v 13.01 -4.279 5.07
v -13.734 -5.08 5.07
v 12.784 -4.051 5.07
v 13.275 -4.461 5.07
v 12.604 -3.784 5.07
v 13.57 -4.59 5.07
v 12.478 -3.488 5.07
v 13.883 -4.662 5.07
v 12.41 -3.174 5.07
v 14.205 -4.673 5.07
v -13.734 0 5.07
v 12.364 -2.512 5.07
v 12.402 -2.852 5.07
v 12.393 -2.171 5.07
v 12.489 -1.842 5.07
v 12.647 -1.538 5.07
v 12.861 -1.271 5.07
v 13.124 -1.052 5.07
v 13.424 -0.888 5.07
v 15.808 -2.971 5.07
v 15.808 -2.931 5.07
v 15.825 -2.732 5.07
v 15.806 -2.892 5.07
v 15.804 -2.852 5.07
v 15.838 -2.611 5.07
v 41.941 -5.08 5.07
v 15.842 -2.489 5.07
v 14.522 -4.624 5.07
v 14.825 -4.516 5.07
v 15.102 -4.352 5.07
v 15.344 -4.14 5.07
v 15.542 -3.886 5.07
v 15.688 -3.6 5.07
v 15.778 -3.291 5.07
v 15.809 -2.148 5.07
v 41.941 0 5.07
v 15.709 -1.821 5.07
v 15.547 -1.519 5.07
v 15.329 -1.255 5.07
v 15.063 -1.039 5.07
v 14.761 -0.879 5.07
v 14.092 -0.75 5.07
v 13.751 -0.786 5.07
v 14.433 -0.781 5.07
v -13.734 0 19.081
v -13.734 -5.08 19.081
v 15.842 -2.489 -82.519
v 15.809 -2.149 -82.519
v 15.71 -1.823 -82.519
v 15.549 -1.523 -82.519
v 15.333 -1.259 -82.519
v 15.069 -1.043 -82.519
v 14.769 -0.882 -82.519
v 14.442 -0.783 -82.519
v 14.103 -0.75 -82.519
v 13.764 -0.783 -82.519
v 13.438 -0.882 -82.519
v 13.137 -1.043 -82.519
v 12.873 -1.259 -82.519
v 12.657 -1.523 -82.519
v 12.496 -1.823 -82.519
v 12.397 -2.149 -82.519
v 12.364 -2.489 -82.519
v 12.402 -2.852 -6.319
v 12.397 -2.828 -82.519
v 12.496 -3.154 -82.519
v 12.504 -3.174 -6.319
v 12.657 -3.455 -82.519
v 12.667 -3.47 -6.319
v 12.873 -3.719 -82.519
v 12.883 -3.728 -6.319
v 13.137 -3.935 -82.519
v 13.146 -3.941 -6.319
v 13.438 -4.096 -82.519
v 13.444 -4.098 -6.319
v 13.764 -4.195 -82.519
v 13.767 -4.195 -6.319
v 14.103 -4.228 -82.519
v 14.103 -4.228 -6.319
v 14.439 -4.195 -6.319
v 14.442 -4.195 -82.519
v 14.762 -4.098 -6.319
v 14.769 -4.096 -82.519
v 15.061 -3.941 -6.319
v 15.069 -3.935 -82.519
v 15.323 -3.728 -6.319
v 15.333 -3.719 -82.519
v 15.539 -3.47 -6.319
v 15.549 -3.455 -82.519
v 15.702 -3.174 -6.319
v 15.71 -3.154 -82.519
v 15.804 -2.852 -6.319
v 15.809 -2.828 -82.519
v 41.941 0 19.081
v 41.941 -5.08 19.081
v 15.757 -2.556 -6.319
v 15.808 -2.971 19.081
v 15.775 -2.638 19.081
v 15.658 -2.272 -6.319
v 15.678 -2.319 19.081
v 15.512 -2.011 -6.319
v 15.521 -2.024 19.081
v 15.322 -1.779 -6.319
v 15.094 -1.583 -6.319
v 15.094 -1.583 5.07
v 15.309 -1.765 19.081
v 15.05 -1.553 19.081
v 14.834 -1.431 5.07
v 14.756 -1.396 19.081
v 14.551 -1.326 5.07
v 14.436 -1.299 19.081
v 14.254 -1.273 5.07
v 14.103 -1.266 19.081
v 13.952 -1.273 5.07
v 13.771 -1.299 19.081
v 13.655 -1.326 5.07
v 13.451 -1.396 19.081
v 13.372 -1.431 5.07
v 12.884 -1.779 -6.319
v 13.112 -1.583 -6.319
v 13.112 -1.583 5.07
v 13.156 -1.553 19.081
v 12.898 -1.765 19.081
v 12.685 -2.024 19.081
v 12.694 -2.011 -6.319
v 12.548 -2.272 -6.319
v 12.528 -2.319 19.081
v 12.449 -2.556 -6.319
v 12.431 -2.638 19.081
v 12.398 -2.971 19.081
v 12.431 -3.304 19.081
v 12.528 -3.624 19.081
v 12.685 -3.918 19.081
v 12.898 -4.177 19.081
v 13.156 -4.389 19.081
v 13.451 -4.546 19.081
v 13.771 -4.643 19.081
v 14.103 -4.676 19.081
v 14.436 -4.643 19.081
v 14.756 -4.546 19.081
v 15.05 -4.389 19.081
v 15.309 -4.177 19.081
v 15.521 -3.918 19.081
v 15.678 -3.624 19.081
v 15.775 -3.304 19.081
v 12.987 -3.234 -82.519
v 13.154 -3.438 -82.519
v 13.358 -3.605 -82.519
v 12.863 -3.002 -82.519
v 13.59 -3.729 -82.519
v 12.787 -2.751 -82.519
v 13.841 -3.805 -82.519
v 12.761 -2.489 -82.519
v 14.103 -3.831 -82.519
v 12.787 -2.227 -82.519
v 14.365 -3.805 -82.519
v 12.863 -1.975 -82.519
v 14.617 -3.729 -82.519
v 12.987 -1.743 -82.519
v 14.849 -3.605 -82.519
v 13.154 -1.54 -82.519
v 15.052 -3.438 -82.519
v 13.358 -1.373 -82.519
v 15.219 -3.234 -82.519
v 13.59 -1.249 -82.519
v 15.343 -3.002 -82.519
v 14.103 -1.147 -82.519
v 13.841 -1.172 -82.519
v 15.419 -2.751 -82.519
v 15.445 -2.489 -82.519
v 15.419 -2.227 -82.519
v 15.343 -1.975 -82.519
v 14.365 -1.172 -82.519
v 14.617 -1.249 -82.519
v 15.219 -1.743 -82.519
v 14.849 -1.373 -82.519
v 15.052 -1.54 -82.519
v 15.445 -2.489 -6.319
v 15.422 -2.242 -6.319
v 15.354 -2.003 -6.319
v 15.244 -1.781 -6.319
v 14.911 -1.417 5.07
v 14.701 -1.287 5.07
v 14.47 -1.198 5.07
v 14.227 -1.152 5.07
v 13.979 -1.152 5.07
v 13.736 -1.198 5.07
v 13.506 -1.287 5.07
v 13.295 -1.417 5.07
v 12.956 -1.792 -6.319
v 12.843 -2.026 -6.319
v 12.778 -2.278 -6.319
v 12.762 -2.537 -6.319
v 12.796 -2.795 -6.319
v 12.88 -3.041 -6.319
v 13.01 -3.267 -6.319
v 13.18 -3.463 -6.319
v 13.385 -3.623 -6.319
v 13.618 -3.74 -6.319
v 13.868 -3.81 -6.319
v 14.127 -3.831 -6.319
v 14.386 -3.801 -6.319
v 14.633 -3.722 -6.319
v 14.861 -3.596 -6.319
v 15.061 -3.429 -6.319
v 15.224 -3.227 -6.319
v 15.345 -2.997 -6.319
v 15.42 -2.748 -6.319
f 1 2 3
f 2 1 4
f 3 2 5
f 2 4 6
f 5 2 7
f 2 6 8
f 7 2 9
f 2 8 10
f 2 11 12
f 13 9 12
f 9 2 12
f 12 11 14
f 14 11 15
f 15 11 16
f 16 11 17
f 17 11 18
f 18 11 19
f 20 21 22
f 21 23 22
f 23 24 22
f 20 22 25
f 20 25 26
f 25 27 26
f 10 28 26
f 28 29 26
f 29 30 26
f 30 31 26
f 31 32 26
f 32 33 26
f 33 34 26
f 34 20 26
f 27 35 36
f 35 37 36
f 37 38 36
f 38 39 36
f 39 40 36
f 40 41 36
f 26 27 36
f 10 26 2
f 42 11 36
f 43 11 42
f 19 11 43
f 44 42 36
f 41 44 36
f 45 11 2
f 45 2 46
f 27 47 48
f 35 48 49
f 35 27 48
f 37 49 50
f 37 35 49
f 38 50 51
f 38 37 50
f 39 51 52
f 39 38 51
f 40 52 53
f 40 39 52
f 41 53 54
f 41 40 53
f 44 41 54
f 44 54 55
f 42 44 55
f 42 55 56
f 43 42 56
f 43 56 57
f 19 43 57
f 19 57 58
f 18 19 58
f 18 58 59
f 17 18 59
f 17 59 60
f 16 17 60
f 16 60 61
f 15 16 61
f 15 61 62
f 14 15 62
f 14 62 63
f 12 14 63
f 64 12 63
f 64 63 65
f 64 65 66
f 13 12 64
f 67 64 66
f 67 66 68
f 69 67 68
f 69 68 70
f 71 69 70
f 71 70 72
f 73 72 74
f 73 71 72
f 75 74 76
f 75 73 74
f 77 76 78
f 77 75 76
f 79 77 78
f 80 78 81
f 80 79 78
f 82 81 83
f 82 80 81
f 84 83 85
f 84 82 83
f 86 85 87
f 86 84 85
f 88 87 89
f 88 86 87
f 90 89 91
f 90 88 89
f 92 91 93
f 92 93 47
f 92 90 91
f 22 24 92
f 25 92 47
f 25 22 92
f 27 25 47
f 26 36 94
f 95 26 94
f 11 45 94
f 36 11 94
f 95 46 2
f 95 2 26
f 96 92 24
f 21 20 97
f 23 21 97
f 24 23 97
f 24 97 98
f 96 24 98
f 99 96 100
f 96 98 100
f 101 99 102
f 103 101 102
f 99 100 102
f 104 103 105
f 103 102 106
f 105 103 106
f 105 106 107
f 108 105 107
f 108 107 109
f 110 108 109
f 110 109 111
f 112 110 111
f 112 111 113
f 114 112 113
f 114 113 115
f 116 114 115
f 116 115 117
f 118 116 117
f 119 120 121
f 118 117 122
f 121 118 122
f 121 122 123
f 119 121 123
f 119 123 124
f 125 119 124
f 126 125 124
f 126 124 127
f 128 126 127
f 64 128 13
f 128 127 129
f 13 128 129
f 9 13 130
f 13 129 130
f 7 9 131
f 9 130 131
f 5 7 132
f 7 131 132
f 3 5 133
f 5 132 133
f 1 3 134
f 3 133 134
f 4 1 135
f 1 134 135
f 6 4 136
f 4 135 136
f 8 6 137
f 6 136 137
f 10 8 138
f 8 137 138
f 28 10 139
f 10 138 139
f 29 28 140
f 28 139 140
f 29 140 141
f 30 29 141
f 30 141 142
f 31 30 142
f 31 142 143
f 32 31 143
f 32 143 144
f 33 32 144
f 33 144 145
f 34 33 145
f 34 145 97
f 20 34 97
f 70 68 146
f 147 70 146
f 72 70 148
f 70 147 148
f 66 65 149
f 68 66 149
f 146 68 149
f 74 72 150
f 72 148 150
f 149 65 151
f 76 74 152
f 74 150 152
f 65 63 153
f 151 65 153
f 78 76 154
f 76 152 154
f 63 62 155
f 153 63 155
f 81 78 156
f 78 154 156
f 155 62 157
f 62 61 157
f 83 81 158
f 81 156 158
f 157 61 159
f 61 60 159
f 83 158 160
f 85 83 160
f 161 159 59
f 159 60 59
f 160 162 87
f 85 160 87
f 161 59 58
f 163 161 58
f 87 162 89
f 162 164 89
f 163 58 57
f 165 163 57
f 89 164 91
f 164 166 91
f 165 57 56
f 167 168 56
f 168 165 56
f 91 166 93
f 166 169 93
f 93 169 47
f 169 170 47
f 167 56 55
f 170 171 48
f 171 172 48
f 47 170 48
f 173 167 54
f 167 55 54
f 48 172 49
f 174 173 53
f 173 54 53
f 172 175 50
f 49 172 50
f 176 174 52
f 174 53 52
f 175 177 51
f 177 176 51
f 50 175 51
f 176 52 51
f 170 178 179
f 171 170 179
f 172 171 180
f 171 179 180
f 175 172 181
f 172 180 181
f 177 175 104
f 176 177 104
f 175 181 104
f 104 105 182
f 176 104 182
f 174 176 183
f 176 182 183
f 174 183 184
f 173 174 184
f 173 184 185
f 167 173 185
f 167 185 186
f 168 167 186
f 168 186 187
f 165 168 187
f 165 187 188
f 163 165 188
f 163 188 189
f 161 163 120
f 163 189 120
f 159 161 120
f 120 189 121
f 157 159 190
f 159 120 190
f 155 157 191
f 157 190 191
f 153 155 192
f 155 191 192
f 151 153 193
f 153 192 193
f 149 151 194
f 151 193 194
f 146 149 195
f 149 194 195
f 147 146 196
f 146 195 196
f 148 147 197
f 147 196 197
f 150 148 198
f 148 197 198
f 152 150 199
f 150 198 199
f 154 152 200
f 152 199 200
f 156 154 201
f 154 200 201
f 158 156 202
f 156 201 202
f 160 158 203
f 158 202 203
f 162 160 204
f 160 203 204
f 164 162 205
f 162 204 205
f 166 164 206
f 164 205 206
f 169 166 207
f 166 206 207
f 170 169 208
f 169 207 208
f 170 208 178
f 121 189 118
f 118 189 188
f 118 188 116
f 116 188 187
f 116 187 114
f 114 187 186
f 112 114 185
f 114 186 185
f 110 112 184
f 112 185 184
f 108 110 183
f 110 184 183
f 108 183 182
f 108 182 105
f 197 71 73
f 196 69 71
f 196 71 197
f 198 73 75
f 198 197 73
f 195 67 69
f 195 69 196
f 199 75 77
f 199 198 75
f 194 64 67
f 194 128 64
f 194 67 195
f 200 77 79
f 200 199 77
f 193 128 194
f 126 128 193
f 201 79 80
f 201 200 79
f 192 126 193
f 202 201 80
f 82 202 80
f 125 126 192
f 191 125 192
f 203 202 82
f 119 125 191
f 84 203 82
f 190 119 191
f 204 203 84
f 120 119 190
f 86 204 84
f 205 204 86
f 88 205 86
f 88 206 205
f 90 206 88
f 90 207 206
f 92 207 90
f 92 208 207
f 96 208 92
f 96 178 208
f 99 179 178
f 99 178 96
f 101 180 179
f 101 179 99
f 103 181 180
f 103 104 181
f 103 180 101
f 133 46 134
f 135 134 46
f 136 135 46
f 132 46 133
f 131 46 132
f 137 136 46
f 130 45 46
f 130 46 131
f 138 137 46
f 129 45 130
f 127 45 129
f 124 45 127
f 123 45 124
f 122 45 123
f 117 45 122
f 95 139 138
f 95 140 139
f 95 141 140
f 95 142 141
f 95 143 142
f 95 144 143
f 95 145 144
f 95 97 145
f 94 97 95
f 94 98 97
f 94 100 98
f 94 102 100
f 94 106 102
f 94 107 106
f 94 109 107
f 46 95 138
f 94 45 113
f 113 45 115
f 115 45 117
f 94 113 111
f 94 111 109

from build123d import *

# Parameters (mm, degrees)
F0_W     = 55.675162
F0_H     = 14.010968
F1_DEPTH = 5.08
F2_R     = 1.739199
F2_R_2   = 1.342124
F3_DEPTH = 101.6
F4_R     = 1.704997
F5_DEPTH = 25.4


with BuildPart() as f1:
    # F0 (on Front) → F1 (new body)
    with BuildSketch(Plane.XZ):
        with Locations((14.103145, 12.075242)):
            Rectangle(F0_W, F0_H)
    extrude(amount=F1_DEPTH)

    # F2 (on face) → F3 (join)
    with BuildSketch(Plane.XY.offset(19.080726)):
        with Locations((14.103145, -2.48879)):
            Circle(F2_R)
        with Locations((14.103145, -2.48879)):
            Circle(F2_R_2, mode=Mode.SUBTRACT)
    extrude(amount=-F3_DEPTH)

    # F4 (on face) → F5 (cut)
    with BuildSketch(Plane.XY.offset(19.080726)):
        with Locations((14.103145, -2.971026)):
            Circle(F4_R)
    extrude(amount=-F5_DEPTH, mode=Mode.SUBTRACT)


solid = f1.part
